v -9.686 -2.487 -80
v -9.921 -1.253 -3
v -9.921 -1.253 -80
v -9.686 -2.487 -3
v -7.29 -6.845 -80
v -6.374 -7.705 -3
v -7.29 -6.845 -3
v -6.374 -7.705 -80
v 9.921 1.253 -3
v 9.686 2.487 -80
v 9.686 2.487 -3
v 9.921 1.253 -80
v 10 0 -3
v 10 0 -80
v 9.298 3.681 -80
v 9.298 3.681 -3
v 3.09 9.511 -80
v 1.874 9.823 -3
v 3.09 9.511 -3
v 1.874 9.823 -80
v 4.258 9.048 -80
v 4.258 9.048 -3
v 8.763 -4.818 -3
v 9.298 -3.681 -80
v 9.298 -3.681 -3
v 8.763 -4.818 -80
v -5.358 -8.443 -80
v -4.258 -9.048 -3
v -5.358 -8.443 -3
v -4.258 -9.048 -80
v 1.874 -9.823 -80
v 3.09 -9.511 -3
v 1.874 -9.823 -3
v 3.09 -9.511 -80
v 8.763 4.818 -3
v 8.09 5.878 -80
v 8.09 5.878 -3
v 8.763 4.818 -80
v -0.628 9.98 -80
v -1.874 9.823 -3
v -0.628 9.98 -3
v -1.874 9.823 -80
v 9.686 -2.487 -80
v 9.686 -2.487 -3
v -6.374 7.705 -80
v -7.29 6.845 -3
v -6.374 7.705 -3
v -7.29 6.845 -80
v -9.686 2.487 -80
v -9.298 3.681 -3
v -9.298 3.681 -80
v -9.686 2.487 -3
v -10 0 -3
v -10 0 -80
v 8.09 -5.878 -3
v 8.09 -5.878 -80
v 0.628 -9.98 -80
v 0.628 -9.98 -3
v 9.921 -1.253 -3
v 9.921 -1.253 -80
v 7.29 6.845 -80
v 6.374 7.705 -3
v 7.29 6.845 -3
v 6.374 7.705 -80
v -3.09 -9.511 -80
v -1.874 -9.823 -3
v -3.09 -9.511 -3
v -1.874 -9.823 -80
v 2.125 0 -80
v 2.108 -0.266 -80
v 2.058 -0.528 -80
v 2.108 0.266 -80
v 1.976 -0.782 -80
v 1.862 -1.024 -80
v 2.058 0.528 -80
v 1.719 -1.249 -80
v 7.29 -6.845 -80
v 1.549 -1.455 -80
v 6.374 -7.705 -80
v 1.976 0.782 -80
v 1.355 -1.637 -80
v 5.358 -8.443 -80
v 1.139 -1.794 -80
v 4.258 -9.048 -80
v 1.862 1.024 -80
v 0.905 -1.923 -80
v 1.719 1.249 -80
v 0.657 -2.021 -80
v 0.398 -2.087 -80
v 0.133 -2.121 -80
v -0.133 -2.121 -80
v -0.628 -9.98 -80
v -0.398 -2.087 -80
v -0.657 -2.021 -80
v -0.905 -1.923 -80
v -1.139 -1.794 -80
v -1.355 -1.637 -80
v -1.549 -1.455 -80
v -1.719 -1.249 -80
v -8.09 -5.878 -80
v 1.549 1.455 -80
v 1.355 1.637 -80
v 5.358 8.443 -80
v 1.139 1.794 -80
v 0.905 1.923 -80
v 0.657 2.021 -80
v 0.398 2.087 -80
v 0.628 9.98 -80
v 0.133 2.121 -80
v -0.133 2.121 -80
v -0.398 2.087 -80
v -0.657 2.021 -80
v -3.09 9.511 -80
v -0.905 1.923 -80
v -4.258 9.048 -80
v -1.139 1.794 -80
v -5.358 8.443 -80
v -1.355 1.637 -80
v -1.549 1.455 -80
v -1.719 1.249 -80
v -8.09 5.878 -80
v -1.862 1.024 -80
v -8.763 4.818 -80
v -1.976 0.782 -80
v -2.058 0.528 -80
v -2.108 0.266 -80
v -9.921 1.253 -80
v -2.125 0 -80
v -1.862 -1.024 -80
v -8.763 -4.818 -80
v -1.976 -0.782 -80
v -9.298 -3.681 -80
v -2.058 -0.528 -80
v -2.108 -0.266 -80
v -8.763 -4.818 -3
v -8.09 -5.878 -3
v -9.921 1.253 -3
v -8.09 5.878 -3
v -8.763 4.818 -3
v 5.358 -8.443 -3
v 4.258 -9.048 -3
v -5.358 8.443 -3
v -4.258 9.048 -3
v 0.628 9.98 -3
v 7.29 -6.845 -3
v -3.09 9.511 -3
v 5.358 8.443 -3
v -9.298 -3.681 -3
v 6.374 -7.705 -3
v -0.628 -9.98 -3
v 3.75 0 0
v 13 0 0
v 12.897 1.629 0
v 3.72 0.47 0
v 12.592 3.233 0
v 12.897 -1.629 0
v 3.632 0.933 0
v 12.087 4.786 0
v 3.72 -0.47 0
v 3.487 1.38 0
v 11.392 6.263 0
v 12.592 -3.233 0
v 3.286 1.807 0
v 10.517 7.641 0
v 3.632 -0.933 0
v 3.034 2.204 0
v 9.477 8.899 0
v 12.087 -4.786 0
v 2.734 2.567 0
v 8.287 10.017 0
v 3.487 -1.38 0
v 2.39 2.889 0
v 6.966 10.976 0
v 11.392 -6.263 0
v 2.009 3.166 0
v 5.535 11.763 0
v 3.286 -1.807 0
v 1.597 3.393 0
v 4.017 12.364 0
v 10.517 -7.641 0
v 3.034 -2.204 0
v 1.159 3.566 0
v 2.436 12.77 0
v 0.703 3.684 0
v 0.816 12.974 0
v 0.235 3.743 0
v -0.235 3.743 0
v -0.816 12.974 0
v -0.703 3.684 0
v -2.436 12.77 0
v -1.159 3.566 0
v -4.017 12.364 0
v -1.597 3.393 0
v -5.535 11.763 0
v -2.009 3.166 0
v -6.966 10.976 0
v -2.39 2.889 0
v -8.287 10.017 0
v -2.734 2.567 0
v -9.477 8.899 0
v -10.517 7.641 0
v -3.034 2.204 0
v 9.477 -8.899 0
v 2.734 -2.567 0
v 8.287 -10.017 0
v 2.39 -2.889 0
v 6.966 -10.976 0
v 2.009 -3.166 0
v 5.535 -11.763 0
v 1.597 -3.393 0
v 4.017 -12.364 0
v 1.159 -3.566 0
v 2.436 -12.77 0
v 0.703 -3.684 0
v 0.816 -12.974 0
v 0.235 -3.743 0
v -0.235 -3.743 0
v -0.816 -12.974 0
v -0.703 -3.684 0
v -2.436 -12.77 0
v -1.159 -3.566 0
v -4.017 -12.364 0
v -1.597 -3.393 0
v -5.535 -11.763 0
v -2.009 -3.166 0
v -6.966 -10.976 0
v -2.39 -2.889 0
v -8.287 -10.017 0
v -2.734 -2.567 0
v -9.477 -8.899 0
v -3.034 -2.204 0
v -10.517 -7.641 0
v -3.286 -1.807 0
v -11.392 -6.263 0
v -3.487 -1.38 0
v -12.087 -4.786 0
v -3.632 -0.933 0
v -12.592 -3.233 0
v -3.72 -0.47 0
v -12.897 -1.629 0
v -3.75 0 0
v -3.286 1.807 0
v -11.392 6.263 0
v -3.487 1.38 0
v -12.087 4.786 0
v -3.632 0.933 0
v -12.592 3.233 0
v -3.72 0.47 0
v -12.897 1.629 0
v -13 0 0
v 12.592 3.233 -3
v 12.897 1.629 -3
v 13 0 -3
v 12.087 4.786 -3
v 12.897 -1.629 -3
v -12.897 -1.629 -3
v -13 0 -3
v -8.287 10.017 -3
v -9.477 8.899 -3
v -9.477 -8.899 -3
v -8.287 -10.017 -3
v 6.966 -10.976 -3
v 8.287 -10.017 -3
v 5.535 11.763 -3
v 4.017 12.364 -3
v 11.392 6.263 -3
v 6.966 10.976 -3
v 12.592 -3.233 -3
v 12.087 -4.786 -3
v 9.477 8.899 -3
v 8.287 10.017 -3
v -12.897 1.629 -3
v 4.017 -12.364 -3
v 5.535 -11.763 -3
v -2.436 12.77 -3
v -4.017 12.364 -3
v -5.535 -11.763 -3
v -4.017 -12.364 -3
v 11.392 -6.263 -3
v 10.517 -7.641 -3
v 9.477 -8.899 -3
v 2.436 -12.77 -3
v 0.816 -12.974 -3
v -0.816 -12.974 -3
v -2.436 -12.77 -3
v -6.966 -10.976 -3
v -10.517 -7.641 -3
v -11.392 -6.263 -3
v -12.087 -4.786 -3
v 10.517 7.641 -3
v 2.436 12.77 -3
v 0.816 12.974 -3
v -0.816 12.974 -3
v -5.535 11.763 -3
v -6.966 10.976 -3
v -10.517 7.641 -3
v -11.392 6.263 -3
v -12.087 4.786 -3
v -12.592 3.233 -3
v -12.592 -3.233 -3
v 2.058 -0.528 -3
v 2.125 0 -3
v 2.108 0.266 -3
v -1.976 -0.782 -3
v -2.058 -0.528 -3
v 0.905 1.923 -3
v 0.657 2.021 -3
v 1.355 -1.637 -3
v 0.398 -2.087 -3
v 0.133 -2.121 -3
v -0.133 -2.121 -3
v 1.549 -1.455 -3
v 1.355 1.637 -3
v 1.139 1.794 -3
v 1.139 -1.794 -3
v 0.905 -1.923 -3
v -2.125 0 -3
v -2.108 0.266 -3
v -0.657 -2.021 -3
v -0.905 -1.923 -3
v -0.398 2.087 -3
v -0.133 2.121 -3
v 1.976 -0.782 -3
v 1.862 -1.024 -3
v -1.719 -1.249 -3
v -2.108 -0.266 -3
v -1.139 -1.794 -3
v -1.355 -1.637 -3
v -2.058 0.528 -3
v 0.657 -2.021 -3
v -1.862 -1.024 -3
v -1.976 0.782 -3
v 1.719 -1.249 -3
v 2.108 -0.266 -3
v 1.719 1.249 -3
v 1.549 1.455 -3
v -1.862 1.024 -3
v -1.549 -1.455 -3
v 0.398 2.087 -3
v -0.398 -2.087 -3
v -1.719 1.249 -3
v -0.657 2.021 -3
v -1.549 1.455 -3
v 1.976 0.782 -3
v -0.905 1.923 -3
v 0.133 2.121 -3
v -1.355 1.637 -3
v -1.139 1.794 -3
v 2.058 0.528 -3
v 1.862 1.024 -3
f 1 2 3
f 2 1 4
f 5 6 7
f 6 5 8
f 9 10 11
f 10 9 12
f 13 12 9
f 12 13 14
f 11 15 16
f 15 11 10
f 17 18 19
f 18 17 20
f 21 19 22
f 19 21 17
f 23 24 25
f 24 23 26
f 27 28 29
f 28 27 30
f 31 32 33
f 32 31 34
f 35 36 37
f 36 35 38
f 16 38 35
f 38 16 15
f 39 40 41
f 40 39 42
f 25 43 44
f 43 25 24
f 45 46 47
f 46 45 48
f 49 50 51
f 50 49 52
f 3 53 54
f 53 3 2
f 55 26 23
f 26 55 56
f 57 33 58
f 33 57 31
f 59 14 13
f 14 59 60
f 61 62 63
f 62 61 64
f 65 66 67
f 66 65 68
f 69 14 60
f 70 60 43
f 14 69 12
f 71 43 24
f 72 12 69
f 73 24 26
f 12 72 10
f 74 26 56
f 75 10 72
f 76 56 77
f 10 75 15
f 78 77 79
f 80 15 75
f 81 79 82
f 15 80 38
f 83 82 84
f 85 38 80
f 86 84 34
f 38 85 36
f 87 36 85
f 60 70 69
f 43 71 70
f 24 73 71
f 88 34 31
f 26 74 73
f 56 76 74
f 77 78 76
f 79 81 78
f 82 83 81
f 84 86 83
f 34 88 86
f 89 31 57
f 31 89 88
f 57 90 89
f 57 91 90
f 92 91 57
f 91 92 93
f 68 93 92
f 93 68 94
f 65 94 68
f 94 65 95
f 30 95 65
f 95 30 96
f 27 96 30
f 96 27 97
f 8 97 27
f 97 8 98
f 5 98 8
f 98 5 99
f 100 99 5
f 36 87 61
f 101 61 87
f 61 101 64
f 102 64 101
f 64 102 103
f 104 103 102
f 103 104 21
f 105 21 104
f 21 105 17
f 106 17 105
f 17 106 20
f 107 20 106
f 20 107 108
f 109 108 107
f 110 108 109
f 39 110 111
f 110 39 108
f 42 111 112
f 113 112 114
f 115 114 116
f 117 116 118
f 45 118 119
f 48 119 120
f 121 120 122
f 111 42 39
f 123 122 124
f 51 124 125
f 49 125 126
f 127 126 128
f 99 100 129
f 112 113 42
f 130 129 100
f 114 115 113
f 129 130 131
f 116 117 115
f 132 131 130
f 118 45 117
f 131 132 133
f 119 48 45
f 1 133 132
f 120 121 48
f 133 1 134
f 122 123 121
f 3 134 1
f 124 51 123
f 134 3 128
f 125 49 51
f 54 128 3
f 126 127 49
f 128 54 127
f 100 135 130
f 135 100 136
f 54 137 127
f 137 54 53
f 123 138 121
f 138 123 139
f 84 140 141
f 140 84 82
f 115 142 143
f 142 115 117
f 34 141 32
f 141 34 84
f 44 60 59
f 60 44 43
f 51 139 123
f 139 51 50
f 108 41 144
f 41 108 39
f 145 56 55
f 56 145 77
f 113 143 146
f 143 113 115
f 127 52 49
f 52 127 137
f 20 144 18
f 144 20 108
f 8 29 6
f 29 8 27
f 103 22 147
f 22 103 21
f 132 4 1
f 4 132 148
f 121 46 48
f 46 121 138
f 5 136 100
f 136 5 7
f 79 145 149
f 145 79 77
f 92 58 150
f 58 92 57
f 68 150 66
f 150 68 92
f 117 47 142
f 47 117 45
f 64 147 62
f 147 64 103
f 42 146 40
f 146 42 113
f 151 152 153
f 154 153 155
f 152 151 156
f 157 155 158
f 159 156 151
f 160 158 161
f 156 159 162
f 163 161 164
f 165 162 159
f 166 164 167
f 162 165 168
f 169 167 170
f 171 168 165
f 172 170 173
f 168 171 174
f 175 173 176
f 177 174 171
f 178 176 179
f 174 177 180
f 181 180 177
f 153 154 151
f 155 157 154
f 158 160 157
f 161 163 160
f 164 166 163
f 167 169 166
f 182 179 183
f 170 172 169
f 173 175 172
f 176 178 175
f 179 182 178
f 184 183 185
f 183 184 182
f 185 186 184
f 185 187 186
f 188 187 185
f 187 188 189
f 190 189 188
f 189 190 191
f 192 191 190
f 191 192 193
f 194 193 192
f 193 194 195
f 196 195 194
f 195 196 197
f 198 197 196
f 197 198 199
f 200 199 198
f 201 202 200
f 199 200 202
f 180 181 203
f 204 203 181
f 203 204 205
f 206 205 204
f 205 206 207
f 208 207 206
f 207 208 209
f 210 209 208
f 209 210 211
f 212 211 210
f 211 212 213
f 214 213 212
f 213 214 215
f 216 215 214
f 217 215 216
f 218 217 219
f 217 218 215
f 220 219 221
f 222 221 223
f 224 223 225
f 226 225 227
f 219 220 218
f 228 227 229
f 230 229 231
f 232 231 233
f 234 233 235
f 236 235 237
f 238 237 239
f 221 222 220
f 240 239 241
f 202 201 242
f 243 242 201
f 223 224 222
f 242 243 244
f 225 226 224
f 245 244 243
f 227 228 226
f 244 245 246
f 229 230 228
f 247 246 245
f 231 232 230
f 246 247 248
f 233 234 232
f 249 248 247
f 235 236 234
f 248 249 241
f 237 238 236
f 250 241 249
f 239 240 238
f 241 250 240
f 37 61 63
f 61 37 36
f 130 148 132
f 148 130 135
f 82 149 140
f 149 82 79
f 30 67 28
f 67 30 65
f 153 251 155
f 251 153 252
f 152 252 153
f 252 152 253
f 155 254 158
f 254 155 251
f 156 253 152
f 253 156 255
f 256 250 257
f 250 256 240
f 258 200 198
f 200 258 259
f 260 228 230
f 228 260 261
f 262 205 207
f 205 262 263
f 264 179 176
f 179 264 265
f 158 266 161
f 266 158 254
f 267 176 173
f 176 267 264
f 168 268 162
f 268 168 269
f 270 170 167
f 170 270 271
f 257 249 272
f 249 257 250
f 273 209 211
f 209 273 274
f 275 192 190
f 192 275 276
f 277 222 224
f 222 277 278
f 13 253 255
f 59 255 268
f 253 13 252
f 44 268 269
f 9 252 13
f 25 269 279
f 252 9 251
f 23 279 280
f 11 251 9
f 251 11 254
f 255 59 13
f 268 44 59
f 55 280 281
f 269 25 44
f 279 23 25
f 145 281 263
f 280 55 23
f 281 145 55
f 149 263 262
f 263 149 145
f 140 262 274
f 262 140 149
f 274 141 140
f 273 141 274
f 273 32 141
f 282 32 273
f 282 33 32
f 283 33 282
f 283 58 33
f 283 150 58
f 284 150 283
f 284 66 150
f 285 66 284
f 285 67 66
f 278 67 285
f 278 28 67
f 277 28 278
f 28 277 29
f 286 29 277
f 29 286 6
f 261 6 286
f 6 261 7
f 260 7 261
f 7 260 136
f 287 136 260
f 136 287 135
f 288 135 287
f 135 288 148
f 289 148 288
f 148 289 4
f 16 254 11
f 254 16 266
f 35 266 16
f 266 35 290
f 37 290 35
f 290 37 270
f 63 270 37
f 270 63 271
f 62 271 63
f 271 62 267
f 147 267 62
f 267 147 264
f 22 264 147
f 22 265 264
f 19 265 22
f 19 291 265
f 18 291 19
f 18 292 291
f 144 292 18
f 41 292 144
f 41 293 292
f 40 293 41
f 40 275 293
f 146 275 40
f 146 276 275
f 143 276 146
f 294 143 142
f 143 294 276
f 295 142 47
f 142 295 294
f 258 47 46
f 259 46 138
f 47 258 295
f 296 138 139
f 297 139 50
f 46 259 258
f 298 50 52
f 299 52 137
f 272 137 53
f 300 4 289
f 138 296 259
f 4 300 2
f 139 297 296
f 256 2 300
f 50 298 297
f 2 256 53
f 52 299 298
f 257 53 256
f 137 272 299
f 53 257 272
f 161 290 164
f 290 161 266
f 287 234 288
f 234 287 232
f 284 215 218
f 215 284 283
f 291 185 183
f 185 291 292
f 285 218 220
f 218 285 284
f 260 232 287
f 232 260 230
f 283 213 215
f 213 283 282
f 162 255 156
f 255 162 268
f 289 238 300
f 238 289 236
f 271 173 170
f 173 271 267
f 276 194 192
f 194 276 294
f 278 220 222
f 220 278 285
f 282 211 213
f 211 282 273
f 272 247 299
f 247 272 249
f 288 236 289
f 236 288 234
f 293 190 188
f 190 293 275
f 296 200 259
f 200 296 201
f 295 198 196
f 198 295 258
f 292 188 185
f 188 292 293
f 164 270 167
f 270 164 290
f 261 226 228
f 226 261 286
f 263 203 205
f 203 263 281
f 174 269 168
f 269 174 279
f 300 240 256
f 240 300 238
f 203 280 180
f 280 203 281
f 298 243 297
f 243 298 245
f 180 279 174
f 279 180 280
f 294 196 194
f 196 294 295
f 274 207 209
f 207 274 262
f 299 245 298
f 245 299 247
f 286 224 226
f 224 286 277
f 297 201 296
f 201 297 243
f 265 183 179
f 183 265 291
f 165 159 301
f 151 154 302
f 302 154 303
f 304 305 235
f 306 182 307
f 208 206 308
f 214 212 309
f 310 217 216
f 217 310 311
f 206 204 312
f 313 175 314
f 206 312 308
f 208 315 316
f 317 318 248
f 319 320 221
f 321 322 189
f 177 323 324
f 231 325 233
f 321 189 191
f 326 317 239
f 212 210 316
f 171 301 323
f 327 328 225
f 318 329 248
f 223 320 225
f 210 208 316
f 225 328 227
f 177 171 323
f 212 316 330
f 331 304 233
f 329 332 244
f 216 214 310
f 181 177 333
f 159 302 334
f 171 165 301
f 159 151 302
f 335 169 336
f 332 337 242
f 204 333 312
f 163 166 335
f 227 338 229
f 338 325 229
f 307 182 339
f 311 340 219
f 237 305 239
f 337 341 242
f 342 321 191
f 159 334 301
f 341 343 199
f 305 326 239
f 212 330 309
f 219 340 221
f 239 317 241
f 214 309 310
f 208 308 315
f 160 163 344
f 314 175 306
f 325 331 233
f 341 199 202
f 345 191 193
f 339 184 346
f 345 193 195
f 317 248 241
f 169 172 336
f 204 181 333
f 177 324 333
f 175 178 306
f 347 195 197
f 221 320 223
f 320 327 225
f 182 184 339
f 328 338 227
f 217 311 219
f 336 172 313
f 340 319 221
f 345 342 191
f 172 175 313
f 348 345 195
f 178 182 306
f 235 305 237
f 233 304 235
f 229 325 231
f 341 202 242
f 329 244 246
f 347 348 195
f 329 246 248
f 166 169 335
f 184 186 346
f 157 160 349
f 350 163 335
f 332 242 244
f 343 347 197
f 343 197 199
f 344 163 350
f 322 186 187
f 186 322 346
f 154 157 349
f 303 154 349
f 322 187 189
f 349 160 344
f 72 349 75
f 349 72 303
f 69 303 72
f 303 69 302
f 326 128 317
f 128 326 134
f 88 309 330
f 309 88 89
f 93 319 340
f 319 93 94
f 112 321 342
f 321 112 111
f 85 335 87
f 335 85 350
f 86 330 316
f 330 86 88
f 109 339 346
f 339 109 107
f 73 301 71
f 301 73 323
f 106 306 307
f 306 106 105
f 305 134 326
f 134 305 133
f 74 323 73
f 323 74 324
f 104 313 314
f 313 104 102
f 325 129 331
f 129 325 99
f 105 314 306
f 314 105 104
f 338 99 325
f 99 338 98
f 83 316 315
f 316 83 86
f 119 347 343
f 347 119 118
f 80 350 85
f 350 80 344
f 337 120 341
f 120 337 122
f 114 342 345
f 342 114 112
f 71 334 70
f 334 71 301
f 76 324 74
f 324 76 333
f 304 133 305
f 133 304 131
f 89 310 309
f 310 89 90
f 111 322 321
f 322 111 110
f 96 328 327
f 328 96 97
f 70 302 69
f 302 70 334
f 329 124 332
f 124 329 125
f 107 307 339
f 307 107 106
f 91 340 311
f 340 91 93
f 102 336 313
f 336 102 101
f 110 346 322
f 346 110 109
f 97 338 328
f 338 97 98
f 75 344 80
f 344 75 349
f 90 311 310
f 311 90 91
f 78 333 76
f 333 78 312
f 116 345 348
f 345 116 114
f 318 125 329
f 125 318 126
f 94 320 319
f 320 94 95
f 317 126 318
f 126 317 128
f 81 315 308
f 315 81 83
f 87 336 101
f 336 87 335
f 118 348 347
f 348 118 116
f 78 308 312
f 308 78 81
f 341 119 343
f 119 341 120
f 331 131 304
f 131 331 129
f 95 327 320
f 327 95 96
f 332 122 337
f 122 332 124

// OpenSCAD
$fn = 50;


difference() {
	union() {
		translate(v = [0, 0, -80.0000000000]) {
			cylinder(h = 80, r = 10.0000000000);
		}
		translate(v = [0, 0, -3.0000000000]) {
			cylinder(h = 3, r = 13.0000000000);
		}
	}
	union() {
		translate(v = [0, 0, 0]) {
			rotate(a = [0, 0, 0]) {
				difference() {
					union() {
						#translate(v = [0, 0, -80.0000000000]) {
							cylinder(h = 80, r = 2.0000000000);
						}
						#translate(v = [0, 0, -3]) {
							cylinder(h = 3, r1 = 2.1250000000, r2 = 3.7500000000);
						}
						#translate(v = [0, 0, -80.0000000000]) {
							cylinder(h = 80, r = 2.1250000000);
						}
						#translate(v = [0, 0, -80.0000000000]) {
							cylinder(h = 80, r = 2.0000000000);
						}
					}
					union();
				}
			}
		}
	}
}
